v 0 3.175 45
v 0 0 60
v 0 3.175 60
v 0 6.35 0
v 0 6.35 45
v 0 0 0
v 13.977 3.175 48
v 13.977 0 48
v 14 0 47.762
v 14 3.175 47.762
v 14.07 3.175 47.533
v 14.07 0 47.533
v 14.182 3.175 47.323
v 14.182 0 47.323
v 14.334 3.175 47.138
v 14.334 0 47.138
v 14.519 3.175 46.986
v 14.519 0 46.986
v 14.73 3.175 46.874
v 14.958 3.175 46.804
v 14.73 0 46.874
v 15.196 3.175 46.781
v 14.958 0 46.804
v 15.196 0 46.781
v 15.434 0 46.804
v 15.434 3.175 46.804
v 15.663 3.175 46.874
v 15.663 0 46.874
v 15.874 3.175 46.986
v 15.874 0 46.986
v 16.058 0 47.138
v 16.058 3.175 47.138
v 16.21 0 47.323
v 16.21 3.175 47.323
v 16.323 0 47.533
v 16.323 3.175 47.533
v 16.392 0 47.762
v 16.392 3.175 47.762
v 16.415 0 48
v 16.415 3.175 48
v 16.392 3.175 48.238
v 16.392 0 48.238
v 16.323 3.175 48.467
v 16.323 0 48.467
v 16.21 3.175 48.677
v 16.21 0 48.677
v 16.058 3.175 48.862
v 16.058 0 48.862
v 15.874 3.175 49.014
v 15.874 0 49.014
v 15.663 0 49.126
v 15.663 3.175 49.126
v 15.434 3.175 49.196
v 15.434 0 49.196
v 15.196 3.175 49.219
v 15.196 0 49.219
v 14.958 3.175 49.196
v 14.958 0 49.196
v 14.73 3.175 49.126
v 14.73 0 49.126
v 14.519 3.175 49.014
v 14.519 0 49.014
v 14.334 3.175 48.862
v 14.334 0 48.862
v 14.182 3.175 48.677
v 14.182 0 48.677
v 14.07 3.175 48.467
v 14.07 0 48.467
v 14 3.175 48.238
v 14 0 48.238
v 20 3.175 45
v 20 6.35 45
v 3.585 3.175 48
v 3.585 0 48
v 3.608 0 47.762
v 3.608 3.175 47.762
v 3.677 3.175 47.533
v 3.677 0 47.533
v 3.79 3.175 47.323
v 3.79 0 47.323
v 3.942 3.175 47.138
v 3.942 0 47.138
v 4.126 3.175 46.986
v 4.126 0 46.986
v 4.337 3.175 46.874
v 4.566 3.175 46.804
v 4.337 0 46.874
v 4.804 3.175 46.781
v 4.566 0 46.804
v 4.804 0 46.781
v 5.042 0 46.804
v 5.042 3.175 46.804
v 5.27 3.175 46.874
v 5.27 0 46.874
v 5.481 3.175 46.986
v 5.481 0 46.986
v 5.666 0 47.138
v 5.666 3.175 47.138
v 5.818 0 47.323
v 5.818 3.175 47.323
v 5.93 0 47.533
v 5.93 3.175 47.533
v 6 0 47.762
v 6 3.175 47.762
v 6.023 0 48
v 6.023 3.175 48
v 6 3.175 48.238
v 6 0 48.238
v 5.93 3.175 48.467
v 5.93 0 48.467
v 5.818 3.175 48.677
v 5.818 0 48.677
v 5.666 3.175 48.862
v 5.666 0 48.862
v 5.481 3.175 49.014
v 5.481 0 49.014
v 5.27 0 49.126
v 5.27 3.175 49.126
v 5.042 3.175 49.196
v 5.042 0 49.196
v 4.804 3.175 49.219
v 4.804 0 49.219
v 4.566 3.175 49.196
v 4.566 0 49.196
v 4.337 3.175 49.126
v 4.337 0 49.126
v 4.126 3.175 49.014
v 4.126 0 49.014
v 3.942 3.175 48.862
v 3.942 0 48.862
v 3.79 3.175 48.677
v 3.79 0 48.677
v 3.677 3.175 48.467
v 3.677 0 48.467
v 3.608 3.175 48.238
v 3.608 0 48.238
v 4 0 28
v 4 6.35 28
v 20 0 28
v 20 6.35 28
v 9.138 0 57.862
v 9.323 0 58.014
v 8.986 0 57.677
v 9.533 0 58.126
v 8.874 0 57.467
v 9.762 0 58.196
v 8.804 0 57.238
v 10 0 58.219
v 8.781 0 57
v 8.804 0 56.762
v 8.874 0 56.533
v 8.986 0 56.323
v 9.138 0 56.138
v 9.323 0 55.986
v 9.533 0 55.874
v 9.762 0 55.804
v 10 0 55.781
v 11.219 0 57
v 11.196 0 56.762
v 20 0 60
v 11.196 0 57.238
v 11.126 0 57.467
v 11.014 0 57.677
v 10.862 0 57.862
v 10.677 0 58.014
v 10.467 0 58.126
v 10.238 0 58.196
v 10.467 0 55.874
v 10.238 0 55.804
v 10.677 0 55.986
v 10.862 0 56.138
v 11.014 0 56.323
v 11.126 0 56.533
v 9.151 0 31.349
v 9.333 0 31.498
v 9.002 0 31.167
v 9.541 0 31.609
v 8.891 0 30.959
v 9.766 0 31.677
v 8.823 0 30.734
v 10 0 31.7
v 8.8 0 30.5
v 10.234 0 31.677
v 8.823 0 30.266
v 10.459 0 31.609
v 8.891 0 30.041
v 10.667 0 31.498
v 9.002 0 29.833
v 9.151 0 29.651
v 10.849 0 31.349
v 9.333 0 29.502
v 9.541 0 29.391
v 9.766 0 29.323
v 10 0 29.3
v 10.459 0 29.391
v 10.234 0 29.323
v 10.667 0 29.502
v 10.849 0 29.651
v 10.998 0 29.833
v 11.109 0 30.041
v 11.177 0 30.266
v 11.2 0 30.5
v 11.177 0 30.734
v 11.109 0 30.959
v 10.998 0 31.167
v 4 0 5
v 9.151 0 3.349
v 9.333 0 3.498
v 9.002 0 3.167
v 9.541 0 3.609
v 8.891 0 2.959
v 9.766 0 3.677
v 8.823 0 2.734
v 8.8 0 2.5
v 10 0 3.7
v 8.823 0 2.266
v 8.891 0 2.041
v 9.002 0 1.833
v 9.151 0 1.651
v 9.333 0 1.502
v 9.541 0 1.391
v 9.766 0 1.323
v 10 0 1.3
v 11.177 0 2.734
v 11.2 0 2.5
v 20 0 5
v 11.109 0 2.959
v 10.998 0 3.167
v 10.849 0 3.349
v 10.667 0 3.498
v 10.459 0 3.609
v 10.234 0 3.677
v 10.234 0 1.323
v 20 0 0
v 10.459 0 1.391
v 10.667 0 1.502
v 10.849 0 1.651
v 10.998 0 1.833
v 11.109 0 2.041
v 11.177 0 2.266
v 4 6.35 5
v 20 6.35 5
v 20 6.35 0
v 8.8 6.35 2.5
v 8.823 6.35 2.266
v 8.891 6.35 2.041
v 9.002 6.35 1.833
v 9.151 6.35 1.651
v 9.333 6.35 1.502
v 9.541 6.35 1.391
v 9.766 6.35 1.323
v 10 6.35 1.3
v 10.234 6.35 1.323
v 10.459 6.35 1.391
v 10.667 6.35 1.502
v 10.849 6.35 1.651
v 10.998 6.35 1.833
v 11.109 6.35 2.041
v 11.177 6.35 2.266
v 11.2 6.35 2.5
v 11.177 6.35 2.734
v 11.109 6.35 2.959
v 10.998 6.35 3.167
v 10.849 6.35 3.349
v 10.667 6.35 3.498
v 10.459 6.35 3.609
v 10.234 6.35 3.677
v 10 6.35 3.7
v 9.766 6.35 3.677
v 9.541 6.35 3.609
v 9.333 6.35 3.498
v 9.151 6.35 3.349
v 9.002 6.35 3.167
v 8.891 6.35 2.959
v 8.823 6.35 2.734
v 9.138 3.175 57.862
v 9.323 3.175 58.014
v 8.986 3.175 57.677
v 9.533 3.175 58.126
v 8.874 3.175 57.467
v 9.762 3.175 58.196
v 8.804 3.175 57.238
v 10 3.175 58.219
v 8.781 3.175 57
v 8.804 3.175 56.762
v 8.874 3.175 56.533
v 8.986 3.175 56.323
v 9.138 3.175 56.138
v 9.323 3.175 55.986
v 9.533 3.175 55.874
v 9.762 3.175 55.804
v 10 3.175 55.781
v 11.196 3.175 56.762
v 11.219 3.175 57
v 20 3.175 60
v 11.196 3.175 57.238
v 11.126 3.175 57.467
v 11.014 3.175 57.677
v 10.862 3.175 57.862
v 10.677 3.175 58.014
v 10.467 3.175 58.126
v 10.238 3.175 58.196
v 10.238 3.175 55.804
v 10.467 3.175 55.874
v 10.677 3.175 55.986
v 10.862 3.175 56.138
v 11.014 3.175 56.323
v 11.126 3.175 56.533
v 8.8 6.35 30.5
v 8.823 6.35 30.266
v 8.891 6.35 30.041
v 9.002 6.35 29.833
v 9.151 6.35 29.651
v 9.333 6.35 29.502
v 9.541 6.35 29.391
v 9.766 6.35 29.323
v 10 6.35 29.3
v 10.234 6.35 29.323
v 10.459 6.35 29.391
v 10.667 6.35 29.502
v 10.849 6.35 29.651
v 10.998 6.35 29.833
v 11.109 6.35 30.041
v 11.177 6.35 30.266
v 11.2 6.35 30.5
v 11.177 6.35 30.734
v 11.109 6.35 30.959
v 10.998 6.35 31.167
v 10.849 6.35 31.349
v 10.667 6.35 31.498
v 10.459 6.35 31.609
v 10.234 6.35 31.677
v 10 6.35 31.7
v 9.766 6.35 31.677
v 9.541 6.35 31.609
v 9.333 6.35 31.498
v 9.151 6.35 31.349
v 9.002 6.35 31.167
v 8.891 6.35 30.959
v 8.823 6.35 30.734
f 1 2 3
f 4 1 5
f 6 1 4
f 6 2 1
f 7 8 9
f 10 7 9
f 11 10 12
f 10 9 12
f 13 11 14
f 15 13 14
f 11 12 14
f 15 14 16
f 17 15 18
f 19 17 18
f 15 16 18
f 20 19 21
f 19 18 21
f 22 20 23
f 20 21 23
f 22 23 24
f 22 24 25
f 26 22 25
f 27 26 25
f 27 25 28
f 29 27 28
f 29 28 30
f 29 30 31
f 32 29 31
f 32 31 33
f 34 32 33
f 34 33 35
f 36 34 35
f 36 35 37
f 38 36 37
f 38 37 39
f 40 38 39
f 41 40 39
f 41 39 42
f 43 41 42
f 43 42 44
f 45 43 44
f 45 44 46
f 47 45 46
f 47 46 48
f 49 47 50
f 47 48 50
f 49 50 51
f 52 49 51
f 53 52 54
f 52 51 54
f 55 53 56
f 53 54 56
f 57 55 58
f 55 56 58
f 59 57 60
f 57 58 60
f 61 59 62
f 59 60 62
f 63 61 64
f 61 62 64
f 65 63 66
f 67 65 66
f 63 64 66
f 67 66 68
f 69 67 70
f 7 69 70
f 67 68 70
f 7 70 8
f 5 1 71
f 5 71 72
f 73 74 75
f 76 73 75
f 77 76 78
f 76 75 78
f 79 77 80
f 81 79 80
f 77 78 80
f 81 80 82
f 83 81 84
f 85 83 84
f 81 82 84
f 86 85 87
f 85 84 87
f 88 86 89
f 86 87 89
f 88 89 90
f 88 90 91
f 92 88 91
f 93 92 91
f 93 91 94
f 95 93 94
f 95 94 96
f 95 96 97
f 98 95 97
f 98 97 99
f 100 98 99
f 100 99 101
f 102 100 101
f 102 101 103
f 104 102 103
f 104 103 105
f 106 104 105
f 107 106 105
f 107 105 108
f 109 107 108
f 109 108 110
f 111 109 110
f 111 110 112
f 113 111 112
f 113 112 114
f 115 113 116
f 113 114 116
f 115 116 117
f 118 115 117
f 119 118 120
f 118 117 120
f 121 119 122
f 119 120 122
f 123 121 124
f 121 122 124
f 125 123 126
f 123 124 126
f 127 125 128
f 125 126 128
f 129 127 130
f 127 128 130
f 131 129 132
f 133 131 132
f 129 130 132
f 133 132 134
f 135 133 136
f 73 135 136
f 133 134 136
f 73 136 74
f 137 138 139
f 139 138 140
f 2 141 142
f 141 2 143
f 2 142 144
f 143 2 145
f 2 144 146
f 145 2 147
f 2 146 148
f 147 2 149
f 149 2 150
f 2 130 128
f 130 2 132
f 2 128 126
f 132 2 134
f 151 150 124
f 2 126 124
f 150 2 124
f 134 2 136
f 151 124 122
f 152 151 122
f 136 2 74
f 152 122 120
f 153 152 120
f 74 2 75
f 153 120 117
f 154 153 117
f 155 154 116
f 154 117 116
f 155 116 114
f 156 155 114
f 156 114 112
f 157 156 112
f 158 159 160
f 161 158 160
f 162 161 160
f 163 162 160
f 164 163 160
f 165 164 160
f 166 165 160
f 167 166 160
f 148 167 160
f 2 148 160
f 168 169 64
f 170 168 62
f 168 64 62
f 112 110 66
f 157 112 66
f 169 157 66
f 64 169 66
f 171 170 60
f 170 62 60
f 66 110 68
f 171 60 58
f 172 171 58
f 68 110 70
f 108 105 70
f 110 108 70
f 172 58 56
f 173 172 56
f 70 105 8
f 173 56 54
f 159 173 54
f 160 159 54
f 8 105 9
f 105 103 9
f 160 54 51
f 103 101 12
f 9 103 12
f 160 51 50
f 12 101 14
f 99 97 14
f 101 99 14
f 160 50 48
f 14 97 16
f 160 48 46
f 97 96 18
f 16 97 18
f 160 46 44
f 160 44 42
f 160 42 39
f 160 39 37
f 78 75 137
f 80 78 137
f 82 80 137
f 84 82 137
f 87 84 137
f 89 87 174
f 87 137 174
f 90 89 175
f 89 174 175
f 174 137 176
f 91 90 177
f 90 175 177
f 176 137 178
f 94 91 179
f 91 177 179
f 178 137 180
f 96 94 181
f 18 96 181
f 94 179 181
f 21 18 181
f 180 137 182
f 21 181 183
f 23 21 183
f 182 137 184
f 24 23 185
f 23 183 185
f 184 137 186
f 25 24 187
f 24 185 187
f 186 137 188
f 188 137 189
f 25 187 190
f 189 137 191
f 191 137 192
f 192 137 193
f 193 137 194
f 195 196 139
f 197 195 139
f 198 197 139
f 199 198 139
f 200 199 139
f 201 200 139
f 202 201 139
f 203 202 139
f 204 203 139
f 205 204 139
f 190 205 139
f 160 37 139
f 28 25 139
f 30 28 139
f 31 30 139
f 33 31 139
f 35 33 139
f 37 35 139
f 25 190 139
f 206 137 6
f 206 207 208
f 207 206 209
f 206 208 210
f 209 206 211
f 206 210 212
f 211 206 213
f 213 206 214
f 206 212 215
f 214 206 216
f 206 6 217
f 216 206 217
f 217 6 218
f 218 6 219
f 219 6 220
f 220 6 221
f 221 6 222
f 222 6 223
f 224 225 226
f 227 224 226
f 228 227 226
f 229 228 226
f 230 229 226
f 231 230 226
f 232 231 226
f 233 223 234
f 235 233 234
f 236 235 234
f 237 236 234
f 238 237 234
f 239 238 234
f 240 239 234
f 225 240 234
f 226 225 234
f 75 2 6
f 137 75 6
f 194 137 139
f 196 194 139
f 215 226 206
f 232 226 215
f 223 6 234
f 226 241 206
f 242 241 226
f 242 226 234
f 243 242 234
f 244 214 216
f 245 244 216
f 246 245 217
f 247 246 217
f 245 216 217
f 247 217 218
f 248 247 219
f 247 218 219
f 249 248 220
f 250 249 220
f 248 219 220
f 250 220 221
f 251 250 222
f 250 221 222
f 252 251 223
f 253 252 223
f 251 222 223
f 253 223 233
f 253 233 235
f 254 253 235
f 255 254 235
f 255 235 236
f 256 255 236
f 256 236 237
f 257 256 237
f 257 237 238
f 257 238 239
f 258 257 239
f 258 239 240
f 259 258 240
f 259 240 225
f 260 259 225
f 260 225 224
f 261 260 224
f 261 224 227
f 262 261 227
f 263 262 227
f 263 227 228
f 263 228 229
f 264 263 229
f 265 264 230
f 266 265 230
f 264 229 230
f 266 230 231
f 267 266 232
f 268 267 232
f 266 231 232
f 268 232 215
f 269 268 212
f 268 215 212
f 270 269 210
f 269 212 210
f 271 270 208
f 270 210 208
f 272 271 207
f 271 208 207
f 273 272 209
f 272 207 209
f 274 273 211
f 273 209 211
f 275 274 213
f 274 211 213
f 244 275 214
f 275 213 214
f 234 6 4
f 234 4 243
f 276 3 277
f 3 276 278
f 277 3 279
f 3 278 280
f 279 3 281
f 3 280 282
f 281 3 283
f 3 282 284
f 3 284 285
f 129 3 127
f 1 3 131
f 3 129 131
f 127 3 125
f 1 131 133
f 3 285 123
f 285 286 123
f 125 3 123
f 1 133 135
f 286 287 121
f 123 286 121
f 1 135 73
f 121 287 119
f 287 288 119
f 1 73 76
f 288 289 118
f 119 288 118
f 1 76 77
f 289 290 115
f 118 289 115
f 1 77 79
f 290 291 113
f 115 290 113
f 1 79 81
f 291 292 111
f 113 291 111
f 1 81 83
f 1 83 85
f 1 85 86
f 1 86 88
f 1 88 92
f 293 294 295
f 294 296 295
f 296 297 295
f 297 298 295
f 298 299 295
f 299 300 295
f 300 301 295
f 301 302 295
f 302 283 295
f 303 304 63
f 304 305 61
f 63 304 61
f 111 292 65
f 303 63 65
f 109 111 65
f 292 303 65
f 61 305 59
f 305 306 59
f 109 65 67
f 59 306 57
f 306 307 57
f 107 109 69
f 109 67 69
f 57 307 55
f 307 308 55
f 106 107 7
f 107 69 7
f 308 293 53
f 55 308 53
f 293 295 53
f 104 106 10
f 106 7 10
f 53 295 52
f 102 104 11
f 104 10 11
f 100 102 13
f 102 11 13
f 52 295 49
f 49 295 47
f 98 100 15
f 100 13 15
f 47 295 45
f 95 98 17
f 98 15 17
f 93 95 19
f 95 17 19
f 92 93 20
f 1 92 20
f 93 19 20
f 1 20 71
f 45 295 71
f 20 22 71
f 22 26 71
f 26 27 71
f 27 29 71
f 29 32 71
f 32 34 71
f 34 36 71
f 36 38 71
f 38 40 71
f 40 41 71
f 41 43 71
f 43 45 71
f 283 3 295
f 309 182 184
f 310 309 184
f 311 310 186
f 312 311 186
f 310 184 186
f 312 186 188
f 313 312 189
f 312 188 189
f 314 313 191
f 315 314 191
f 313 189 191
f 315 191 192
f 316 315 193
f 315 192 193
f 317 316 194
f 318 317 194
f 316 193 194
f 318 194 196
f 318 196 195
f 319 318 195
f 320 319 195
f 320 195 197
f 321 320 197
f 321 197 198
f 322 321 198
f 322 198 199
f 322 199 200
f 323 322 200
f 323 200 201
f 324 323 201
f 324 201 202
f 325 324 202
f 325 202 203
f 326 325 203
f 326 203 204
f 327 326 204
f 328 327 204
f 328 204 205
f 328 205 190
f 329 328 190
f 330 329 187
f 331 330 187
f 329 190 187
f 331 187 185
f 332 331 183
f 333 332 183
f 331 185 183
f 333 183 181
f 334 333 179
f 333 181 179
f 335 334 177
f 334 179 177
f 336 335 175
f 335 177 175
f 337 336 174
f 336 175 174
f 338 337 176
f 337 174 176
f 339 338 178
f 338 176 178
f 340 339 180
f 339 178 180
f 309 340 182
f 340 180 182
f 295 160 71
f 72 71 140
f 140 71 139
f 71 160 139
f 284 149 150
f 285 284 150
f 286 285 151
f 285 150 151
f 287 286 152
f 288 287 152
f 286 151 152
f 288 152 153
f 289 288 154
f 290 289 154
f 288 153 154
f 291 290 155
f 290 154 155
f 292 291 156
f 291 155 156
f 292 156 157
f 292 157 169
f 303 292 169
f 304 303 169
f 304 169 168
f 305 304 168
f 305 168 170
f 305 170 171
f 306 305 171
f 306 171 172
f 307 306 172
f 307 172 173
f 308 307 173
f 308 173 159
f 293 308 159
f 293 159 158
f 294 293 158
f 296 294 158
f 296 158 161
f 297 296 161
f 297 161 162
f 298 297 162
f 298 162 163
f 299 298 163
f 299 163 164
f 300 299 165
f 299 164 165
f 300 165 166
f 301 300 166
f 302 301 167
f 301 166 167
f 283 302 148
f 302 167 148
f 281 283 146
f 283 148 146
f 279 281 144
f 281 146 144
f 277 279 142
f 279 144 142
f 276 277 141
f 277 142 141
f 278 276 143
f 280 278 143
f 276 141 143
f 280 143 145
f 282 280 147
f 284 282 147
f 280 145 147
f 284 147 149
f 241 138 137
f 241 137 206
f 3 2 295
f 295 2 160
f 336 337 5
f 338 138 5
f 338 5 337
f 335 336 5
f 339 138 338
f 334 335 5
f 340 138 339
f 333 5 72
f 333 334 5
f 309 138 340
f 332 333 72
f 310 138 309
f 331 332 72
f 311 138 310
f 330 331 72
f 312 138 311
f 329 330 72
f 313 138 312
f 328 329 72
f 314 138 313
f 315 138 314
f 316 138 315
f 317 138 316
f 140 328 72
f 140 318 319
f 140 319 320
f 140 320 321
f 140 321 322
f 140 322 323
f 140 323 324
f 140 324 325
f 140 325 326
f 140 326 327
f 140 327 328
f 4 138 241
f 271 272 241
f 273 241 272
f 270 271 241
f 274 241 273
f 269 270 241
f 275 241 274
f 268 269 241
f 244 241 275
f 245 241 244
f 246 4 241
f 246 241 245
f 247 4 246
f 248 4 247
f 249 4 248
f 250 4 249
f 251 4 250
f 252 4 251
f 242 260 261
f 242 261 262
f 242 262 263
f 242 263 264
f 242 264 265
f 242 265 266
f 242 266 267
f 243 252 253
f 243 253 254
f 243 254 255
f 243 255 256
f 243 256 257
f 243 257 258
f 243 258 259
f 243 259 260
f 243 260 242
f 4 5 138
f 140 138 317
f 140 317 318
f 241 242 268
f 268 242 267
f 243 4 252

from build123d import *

# Parameters (mm, degrees)
SKETCH2_W             = 20
SKETCH2_H             = 60
BOSS_EXTRUDE1_DEPTH   = 6.35
SKETCH4_W             = 16
SKETCH4_H             = 23
CUT_EXTRUDE1_DEPTH    = 64.563531211
M2_CLEARANCE_HOLE1_D  = 2.4
SKETCH10_W            = 15
SKETCH10_H            = 3.175
CUT_EXTRUDE2_DEPTH    = 64.563531211
F_2_CLEARANCE_HOLE1_D = 2.4384


with BuildPart() as part:
    # Sketch2 → Boss-Extrude1 (new body)
    with BuildSketch(Plane(origin=(0, 0, 0), x_dir=(1, 0, 0), z_dir=(0, 1, 0))):
        with Locations((10, -30)):
            Rectangle(SKETCH2_W, SKETCH2_H)
    extrude(amount=BOSS_EXTRUDE1_DEPTH)

    # Sketch4 → Cut-Extrude1 (cut, through all)
    with BuildSketch(Plane(origin=(0, 6.35, 0), x_dir=(1, 0, 0), z_dir=(0, 1, 0))):
        with Locations((12, -16.5)):
            Rectangle(SKETCH4_W, SKETCH4_H)
    extrude(amount=-CUT_EXTRUDE1_DEPTH, mode=Mode.SUBTRACT)

    # M2 Clearance Hole1 (through all)
    with Locations(Plane(origin=(0, 6.35, 0), x_dir=(1, 0, 0), z_dir=(0, 1, 0))):
        with Locations((10, -30.5), (10, -2.5)):
            Hole(M2_CLEARANCE_HOLE1_D / 2)

    # Sketch10 → Cut-Extrude2 (cut, through all)
    with BuildSketch(Plane(origin=(20, 0, 0), x_dir=(0, 0, -1), z_dir=(1, 0, 0))):
        with Locations((-52.5, 4.7625)):
            Rectangle(SKETCH10_W, SKETCH10_H)
    extrude(amount=-CUT_EXTRUDE2_DEPTH, mode=Mode.SUBTRACT)

    # #2 Clearance Hole1 (through all)
    with Locations(Plane(origin=(0, 3.175, 0), x_dir=(1, 0, 0), z_dir=(0, 1, 0))):
        with Locations((4.803847577, -48), (15.196152423, -48), (10, -57)):
            Hole(F_2_CLEARANCE_HOLE1_D / 2)


solid = part.part
